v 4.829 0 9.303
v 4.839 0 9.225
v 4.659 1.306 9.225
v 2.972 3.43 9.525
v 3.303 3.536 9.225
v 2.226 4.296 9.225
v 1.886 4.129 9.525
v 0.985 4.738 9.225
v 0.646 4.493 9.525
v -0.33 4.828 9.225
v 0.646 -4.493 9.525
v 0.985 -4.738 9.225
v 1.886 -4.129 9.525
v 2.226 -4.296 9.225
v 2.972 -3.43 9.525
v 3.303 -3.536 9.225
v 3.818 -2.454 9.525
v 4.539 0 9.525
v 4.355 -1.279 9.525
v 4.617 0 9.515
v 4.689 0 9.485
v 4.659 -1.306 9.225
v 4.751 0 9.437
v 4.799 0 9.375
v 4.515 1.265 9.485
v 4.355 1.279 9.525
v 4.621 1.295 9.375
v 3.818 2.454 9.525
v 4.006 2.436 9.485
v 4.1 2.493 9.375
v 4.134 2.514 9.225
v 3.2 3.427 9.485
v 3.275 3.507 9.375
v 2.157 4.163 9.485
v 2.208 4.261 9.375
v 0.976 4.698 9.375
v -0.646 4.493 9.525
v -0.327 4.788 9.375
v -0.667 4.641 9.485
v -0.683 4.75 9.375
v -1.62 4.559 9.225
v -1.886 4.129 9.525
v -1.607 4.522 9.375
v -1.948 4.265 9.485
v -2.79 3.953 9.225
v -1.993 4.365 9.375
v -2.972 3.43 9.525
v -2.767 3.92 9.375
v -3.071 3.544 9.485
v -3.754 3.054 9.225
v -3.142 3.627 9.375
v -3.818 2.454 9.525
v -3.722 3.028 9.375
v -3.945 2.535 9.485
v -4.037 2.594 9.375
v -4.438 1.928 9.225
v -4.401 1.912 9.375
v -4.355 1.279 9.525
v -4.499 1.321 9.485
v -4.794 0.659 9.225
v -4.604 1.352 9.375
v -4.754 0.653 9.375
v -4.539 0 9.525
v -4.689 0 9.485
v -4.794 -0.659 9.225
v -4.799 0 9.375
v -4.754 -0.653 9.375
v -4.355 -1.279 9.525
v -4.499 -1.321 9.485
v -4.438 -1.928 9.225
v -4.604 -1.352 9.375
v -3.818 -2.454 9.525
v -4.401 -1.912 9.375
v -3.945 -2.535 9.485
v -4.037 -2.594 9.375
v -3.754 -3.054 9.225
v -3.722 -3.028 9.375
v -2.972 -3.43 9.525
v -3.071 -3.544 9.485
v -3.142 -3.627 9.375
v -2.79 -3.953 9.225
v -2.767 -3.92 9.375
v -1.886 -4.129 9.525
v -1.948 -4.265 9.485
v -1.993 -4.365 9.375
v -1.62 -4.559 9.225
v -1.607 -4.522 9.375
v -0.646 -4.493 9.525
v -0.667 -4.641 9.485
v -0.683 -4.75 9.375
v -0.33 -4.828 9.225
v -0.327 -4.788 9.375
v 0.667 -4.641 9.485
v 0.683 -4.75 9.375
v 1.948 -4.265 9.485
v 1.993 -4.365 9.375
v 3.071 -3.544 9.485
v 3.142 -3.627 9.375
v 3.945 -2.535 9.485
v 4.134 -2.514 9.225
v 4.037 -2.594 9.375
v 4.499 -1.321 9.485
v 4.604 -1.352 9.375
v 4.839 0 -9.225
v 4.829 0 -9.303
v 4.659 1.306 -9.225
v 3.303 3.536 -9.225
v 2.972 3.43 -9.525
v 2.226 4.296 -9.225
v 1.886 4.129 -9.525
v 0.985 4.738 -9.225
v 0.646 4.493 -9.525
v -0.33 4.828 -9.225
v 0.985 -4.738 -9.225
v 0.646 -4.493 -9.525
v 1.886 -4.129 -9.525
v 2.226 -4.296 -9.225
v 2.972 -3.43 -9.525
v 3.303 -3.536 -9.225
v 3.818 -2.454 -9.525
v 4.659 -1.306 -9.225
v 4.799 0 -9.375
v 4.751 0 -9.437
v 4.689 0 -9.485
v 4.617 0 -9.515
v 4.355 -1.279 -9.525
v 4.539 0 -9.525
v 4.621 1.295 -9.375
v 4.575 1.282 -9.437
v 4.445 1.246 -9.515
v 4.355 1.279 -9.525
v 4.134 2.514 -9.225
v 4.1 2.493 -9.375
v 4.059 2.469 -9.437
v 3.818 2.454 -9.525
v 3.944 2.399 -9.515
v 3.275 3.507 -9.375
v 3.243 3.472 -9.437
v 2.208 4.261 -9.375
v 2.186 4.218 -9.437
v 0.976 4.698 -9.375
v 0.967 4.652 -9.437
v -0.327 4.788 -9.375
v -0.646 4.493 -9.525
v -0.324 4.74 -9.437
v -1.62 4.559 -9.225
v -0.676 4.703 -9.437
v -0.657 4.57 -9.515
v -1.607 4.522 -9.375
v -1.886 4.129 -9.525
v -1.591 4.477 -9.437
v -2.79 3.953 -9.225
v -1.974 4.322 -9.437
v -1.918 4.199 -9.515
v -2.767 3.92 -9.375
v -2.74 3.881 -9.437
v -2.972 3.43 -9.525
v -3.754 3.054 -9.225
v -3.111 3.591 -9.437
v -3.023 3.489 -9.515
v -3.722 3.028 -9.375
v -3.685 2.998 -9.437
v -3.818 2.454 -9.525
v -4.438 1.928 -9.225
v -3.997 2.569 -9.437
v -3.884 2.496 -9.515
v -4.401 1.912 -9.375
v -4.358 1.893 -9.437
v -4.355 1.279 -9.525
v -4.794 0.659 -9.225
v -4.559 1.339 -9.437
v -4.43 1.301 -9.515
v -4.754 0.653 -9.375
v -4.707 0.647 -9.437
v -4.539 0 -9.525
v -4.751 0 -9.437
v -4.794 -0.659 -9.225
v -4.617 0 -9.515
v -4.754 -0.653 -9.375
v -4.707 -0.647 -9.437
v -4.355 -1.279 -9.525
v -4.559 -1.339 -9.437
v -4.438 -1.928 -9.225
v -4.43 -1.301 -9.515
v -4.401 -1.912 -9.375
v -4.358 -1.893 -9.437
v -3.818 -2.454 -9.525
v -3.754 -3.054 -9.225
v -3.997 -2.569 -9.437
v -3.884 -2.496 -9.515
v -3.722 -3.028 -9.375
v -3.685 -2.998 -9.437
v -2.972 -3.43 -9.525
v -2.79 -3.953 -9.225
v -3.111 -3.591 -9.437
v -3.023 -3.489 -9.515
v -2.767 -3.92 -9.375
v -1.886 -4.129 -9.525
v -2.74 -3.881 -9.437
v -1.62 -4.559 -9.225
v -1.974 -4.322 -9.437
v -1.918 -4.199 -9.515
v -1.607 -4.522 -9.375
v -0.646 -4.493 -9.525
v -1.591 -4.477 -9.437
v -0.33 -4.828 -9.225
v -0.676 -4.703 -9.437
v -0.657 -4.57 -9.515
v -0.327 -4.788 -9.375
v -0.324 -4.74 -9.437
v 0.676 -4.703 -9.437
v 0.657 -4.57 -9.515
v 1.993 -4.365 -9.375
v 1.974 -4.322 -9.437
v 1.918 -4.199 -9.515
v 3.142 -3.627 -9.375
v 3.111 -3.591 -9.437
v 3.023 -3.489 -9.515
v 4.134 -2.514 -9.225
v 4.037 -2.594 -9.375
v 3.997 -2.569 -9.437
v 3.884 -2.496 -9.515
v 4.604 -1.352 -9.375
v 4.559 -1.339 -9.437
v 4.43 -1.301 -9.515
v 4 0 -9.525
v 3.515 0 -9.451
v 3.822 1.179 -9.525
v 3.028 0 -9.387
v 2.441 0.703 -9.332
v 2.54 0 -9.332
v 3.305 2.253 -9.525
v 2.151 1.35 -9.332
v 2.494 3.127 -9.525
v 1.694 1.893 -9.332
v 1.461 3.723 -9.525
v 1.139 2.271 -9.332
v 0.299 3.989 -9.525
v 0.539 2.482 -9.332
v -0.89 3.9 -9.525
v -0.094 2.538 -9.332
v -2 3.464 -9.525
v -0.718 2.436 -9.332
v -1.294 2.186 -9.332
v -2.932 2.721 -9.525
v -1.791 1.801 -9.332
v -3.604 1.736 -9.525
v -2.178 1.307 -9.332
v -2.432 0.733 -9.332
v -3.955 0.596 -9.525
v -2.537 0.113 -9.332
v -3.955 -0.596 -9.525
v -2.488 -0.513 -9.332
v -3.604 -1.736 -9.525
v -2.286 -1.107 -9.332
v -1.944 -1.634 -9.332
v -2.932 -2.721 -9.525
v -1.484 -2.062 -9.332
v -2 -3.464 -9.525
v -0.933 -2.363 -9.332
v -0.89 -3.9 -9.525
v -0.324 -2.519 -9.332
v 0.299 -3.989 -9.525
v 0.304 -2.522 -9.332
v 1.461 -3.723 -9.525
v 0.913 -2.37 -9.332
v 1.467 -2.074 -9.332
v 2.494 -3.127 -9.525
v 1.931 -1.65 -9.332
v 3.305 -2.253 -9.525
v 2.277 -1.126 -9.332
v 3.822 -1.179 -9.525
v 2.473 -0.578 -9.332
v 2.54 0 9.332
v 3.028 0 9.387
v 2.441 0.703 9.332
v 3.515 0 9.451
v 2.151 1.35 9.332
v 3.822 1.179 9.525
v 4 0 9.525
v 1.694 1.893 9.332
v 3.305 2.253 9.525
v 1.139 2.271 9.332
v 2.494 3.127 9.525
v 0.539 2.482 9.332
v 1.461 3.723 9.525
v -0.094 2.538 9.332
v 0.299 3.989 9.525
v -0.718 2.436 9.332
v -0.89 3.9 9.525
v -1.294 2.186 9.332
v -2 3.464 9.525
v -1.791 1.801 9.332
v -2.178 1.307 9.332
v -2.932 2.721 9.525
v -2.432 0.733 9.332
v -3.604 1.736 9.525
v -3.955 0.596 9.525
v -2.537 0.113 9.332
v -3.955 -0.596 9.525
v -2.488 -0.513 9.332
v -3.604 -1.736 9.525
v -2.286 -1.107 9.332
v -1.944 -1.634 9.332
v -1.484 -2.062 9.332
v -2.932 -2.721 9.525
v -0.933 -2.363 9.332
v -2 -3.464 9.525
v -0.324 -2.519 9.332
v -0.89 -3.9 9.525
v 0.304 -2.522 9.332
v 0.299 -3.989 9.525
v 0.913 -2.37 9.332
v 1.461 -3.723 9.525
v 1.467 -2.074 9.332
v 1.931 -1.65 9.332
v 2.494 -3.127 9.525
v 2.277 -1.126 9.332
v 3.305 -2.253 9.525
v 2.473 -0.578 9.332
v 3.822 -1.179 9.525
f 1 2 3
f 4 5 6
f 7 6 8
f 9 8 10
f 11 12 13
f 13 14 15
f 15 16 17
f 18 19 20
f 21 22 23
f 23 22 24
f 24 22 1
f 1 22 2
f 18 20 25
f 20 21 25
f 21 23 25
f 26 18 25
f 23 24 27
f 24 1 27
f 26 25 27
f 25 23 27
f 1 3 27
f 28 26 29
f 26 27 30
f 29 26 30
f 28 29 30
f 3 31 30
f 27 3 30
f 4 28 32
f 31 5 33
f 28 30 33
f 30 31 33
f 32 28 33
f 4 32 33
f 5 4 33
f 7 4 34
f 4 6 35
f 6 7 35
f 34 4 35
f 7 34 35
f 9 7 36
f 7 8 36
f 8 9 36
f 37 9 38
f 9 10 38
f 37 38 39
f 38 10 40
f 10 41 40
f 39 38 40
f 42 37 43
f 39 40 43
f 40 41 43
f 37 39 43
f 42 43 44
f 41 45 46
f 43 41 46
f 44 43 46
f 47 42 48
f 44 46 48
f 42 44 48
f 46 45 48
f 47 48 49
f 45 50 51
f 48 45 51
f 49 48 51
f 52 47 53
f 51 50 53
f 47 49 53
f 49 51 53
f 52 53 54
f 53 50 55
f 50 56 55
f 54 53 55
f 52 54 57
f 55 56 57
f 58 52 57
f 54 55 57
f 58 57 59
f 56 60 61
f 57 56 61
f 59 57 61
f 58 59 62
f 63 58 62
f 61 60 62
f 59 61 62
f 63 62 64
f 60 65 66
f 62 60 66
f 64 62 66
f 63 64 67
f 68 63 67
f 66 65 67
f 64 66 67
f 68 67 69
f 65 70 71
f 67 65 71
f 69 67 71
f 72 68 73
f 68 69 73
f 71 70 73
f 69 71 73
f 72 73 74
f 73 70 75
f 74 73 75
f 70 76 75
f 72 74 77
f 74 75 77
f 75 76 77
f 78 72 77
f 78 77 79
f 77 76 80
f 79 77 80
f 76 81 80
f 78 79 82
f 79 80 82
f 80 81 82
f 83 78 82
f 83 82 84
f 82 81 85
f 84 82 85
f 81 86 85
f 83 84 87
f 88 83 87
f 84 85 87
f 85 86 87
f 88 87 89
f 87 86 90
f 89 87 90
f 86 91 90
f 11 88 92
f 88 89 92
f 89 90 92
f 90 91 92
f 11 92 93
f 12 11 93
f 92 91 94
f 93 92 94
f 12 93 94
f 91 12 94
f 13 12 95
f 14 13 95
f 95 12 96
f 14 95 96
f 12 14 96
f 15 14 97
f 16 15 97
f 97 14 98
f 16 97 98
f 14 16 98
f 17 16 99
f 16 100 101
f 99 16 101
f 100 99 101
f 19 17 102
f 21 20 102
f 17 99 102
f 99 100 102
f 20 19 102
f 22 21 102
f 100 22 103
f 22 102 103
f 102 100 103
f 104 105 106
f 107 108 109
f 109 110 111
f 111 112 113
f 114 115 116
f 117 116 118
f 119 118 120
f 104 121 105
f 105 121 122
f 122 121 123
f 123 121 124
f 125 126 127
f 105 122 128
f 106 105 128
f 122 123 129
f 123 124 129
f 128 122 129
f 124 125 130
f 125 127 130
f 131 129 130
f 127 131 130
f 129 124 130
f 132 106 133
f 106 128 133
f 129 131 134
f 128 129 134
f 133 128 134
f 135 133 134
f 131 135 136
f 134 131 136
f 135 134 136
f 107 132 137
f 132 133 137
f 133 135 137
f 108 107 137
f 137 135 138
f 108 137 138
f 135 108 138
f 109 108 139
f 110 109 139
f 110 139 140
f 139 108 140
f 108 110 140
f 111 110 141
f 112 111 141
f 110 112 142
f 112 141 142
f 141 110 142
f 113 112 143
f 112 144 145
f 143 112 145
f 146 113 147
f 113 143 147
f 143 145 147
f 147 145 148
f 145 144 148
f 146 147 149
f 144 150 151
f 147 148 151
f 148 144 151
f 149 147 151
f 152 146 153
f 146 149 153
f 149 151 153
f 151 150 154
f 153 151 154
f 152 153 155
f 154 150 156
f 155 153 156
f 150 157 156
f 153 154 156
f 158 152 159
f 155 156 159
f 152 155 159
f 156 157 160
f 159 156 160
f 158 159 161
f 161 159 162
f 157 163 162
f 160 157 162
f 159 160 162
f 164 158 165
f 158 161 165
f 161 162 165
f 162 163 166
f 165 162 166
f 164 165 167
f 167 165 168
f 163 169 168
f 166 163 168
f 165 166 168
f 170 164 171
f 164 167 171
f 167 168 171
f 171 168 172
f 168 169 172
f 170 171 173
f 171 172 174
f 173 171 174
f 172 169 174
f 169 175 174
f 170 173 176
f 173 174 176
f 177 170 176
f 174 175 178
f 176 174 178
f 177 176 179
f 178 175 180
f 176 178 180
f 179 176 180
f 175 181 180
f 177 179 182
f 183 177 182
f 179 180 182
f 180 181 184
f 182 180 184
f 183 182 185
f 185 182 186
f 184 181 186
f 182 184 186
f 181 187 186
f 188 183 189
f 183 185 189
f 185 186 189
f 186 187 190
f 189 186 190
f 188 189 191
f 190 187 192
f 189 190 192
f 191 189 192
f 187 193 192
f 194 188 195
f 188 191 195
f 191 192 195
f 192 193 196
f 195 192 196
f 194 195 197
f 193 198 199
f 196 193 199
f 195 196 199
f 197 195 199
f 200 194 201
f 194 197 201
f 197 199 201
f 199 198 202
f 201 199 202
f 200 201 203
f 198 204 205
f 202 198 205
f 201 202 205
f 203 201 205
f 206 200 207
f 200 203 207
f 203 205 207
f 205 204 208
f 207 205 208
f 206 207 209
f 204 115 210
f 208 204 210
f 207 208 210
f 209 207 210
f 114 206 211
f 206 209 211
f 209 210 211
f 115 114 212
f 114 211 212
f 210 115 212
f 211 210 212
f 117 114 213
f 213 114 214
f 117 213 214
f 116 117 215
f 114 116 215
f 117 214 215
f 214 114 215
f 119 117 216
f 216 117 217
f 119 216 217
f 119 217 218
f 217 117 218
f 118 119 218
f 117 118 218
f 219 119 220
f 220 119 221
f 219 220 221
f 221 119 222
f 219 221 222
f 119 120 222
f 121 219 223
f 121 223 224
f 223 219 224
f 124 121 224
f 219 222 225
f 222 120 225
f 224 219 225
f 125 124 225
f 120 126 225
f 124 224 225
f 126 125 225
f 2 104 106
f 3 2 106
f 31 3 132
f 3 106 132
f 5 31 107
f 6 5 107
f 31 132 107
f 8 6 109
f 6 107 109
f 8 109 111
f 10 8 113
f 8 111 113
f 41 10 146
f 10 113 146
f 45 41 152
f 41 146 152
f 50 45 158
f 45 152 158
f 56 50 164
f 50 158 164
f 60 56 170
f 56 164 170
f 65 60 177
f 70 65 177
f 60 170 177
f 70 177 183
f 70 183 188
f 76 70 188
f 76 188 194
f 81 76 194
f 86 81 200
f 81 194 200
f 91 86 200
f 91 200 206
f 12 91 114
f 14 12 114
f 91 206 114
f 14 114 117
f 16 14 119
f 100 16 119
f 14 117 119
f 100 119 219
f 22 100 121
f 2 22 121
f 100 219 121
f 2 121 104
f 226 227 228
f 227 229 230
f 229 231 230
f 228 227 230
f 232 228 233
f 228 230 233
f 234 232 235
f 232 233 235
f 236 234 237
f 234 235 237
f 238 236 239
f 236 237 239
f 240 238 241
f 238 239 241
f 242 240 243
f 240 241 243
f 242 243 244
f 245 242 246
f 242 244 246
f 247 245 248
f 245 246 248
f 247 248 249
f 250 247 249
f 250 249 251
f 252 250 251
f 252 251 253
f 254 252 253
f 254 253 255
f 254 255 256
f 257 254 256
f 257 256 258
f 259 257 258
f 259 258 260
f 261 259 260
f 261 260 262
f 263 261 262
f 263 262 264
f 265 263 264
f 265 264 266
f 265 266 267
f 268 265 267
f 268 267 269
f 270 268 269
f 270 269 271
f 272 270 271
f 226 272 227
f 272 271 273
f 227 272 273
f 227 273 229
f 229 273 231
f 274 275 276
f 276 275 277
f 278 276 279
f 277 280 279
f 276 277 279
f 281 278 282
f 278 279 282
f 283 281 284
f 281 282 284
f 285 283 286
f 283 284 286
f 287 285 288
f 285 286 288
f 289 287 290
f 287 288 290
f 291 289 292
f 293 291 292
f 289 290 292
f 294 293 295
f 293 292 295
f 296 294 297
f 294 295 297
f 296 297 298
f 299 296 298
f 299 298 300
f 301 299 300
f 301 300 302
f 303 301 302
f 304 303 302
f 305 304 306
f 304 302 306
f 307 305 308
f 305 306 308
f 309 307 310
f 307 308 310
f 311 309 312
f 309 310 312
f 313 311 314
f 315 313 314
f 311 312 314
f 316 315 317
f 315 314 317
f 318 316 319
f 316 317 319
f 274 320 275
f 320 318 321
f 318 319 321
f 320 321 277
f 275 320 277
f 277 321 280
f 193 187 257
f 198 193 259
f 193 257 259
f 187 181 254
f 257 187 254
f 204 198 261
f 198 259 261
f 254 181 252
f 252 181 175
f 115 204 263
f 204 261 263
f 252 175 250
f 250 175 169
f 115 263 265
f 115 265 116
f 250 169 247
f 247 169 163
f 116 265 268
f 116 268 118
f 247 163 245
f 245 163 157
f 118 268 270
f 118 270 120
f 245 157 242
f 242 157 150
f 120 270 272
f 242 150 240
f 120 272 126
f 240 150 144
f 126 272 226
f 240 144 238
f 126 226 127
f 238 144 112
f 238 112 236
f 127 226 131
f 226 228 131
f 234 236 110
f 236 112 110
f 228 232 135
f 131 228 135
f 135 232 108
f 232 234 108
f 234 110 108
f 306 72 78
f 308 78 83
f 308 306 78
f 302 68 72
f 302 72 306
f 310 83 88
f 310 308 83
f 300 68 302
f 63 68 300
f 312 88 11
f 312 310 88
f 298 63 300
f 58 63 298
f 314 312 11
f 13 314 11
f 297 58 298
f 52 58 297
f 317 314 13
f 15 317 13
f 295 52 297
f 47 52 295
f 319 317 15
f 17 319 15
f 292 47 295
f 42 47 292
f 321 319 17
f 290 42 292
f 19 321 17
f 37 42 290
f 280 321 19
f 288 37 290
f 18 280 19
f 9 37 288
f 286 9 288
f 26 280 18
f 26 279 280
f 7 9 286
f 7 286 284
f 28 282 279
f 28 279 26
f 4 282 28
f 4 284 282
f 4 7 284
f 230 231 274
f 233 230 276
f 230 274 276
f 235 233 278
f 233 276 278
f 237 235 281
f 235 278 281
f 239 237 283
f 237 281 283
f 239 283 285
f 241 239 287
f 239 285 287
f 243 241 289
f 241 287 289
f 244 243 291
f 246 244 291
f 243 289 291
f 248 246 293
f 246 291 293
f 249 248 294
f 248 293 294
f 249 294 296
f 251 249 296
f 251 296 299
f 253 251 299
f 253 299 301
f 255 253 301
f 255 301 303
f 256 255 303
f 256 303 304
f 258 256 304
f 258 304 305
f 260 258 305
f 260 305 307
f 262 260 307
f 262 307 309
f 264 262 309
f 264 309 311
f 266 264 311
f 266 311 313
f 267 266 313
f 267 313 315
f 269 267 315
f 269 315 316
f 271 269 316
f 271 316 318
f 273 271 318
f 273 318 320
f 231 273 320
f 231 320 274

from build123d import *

# Parameters (mm, degrees)
DRAFT1_START       = -9.525
DRAFT1_OUTLINE_R   = 4.838885636
DRAFT1_DEPTH       = 19.05
DRAFT2_ANGLE       = 45
DRAFT3_ANGLE       = 44.810245375
DRAFT4_ANGLE       = 45
DRAFT5_ANGLE       = 45
DRAFT6_ANGLE       = 44.810245375
DRAFT7_ANGLE       = 44.810245375
DRAFT8_ANGLE       = 45
DRAFT9_ANGLE       = 45
DRAFT10_ANGLE      = 45
DRAFT11_ANGLE      = 45
DRAFT12_ANGLE      = 45
FILLET1_R          = 0.0127
CHAMFER1_SIZE      = 0.017960514
FILLET2_R          = 0.3
SKETCH1_R          = 2.54
CUT_EXTRUDE1_DEPTH = 21.241841037


with BuildPart() as part:
    # Draft1: read off the stored shape, not the designer's step
    # Draft1 outline → Draft1 (new body)
    with BuildSketch(Plane.XY.offset(DRAFT1_START)):
        Circle(DRAFT1_OUTLINE_R)
        Polygon((-1.0918, 1.6252), (-0.9521, 1.4855), (-0.9521, 1.6125), (0.9521, 1.6125), (0.9521, 1.4855), (1.0918, 1.6252), (1.168210303, 1.548789697), (1.2315, 1.6125), (1.6125, 1.6125), (1.6125, 1.231499999), (1.485500001, 1.231499999), (1.6252, 1.0918), (1.4855, 0.9521), (1.6125, 0.9521), (1.6125, -0.9521), (1.4855, -0.9521), (1.6252, -1.0918), (1.485500001, -1.231499999), (1.612499999, -1.231499999), (1.6125, -1.6125), (1.2315, -1.6125), (1.2315, -1.4855), (1.0918, -1.6252), (0.9521, -1.4855), (0.9521, -1.6125), (-0.9521, -1.6125), (-0.9521, -1.4855), (-1.0918, -1.6252), (-1.2315, -1.4855), (-1.2315, -1.6125), (-1.6125, -1.6125), (-1.6125, -1.231499999), (-1.485500001, -1.231499999), (-1.6252, -1.0918), (-1.4855, -0.9521), (-1.6125, -0.9521), (-1.6125, 0.9521), (-1.4855, 0.9521), (-1.6252, 1.0918), (-1.485500001, 1.231499999), (-1.612499999, 1.231499999), (-1.6125, 1.6125), (-1.2315, 1.6125), (-1.2315, 1.4855), align=None, mode=Mode.SUBTRACT)
    extrude(amount=DRAFT1_DEPTH)

    # Draft1 2 outline → Draft1 2 (revolve, cut)
    with BuildSketch(Plane.XZ):
        with BuildLine():
            Line((1.6125, -9.525), (4, -9.525))
            ThreePointArc((4, -9.525), (2.809495756, -9.361292288), (1.6125, -9.254982683))
            Line((1.6125, -9.254982683), (1.6125, -9.525))
        make_face()
        with BuildLine():
            Line((1.6125, 9.525), (1.6125, 9.254982683))
            ThreePointArc((1.6125, 9.254982683), (2.809495756, 9.361292288), (4, 9.525))
            Line((4, 9.525), (1.6125, 9.525))
        make_face()
    revolve(axis=Axis((0, 0, 0), (0, 0, 1)), mode=Mode.SUBTRACT)

    # Draft2
    draft2_faces = [part.faces().sort_by_distance(p)[0] for p in [
        (1.549009001, 1.231499999, 0),
    ]]
    draft(draft2_faces, Plane(origin=(1.6125, -1.6125, 11.43), x_dir=(0, 0, -1), z_dir=(-1, 0, 0)), DRAFT2_ANGLE)

    # Draft3
    draft3_faces = [part.faces().sort_by_distance(p)[0] for p in [
        (1.549009001, -1.231499999, 0),
    ]]
    draft(draft3_faces, Plane(origin=(1.6125, -1.6125, 11.43), x_dir=(0, 0, -1), z_dir=(-1, 0, 0)), DRAFT3_ANGLE)

    # Draft4
    draft4_faces = [part.faces().sort_by_distance(p)[0] for p in [
        (1.2315, -1.549009001, 0),
    ]]
    draft(draft4_faces, Plane(origin=(-1.6125, -1.6125, 11.43), x_dir=(0, 0, 1), z_dir=(0, 1, 0)), DRAFT4_ANGLE)

    # Draft5
    draft5_faces = [part.faces().sort_by_distance(p)[0] for p in [
        (-1.2315, 1.549009001, 0),
    ]]
    draft(draft5_faces, Plane(origin=(1.6125, 1.6125, 11.43), x_dir=(0, 0, -1), z_dir=(0, -1, 0)), DRAFT5_ANGLE)

    # Draft6
    draft6_faces = [part.faces().sort_by_distance(p)[0] for p in [
        (-1.549009001, 1.231499999, 0),
    ]]
    draft(draft6_faces, Plane(origin=(-1.6125, 1.6125, 11.43), x_dir=(0, 0, 1), z_dir=(1, 0, 0)), DRAFT6_ANGLE)

    # Draft7
    draft7_faces = [part.faces().sort_by_distance(p)[0] for p in [
        (-1.2315, -1.549009001, 0),
    ]]
    draft(draft7_faces, Plane(origin=(-1.6125, -1.6125, 11.43), x_dir=(0, 0, 1), z_dir=(0, 1, 0)), DRAFT7_ANGLE)

    # Draft8
    draft8_faces = [part.faces().sort_by_distance(p)[0] for p in [
        (-1.549009001, -1.231499999, 0),
    ]]
    draft(draft8_faces, Plane(origin=(-1.6125, 1.6125, 11.43), x_dir=(0, 0, 1), z_dir=(1, 0, 0)), DRAFT8_ANGLE)

    # Draft9
    draft9_faces = [part.faces().sort_by_distance(p)[0] for p in [
        (-0.9521, 1.549009008, 0),
        (0.9521, 1.549009008, 0),
    ]]
    draft(draft9_faces, Plane(origin=(1.6125, 1.6125, 11.43), x_dir=(0, 0, -1), z_dir=(0, -1, 0)), DRAFT9_ANGLE)

    # Draft10
    draft10_faces = [part.faces().sort_by_distance(p)[0] for p in [
        (1.549009008, -0.9521, 0),
        (1.549009008, 0.9521, 0),
    ]]
    draft(draft10_faces, Plane(origin=(1.6125, -1.6125, 11.43), x_dir=(0, 0, -1), z_dir=(-1, 0, 0)), DRAFT10_ANGLE)

    # Draft11
    draft11_faces = [part.faces().sort_by_distance(p)[0] for p in [
        (-0.9521, -1.549009008, 0),
        (0.9521, -1.549009008, 0),
    ]]
    draft(draft11_faces, Plane(origin=(-1.6125, -1.6125, 11.43), x_dir=(0, 0, 1), z_dir=(0, 1, 0)), DRAFT11_ANGLE)

    # Draft12
    draft12_faces = [part.faces().sort_by_distance(p)[0] for p in [
        (-1.549009008, 0.9521, 0),
        (-1.549009008, -0.9521, 0),
    ]]
    draft(draft12_faces, Plane(origin=(-1.6125, 1.6125, 11.43), x_dir=(0, 0, 1), z_dir=(1, 0, 0)), DRAFT12_ANGLE)

    # Fillet1
    fillet1_edges = [part.edges().sort_by_distance(p)[0] for p in [
        (-1.0156, 1.549, 0),
        (-1.168, 1.549, 0),
        (-1.548789698, 1.168210302, 0),
        (-1.549, 1.0156, 0),
        (-1.549, -1.0156, 0),
        (-1.549, -1.168, 0),
        (-1.168210303, -1.548789697, 0),
        (-1.0156, -1.549, 0),
        (1.0156, -1.549, 0),
        (1.168, -1.549, 0),
        (1.548789698, -1.168210302, 0),
        (1.549, -1.0156, 0),
        (1.549, 1.0156, 0),
        (1.549, 1.168, 0),
        (1.168210303, 1.548789697, 0),
        (1.0156, 1.549, 0),
    ]]
    fillet(fillet1_edges, radius=FILLET1_R)

    # Chamfer1
    chamfer1_edges = [part.edges().sort_by_distance(p)[0] for p in [
        (-1.0918, 1.6252, 0),
        (-1.6252, 1.0918, 0),
        (-1.6252, -1.0918, 0),
        (1.6252, -1.0918, 0),
        (1.6252, 1.0918, 0),
        (1.0918, 1.6252, 0),
    ]]
    chamfer(chamfer1_edges, length=CHAMFER1_SIZE)

    # Fillet2
    fillet2_edges = [part.edges().sort_by_distance(p)[0] for p in [
        (-4.838885636, 0, 9.525),
        (-4.838885636, 0, -9.525),
        (-1.6125, 1.6125, 0),
        (-1.6125, -1.6125, 0),
        (1.6125, -1.6125, 0),
        (1.6125, 1.6125, 0),
    ]]
    fillet(fillet2_edges, radius=FILLET2_R)

    # Sketch1 → Cut-Extrude1 (cut, through all)
    with BuildSketch(Plane.XY.offset(9.525)):
        Circle(SKETCH1_R)
    extrude(amount=-CUT_EXTRUDE1_DEPTH, mode=Mode.SUBTRACT)


solid = part.part
